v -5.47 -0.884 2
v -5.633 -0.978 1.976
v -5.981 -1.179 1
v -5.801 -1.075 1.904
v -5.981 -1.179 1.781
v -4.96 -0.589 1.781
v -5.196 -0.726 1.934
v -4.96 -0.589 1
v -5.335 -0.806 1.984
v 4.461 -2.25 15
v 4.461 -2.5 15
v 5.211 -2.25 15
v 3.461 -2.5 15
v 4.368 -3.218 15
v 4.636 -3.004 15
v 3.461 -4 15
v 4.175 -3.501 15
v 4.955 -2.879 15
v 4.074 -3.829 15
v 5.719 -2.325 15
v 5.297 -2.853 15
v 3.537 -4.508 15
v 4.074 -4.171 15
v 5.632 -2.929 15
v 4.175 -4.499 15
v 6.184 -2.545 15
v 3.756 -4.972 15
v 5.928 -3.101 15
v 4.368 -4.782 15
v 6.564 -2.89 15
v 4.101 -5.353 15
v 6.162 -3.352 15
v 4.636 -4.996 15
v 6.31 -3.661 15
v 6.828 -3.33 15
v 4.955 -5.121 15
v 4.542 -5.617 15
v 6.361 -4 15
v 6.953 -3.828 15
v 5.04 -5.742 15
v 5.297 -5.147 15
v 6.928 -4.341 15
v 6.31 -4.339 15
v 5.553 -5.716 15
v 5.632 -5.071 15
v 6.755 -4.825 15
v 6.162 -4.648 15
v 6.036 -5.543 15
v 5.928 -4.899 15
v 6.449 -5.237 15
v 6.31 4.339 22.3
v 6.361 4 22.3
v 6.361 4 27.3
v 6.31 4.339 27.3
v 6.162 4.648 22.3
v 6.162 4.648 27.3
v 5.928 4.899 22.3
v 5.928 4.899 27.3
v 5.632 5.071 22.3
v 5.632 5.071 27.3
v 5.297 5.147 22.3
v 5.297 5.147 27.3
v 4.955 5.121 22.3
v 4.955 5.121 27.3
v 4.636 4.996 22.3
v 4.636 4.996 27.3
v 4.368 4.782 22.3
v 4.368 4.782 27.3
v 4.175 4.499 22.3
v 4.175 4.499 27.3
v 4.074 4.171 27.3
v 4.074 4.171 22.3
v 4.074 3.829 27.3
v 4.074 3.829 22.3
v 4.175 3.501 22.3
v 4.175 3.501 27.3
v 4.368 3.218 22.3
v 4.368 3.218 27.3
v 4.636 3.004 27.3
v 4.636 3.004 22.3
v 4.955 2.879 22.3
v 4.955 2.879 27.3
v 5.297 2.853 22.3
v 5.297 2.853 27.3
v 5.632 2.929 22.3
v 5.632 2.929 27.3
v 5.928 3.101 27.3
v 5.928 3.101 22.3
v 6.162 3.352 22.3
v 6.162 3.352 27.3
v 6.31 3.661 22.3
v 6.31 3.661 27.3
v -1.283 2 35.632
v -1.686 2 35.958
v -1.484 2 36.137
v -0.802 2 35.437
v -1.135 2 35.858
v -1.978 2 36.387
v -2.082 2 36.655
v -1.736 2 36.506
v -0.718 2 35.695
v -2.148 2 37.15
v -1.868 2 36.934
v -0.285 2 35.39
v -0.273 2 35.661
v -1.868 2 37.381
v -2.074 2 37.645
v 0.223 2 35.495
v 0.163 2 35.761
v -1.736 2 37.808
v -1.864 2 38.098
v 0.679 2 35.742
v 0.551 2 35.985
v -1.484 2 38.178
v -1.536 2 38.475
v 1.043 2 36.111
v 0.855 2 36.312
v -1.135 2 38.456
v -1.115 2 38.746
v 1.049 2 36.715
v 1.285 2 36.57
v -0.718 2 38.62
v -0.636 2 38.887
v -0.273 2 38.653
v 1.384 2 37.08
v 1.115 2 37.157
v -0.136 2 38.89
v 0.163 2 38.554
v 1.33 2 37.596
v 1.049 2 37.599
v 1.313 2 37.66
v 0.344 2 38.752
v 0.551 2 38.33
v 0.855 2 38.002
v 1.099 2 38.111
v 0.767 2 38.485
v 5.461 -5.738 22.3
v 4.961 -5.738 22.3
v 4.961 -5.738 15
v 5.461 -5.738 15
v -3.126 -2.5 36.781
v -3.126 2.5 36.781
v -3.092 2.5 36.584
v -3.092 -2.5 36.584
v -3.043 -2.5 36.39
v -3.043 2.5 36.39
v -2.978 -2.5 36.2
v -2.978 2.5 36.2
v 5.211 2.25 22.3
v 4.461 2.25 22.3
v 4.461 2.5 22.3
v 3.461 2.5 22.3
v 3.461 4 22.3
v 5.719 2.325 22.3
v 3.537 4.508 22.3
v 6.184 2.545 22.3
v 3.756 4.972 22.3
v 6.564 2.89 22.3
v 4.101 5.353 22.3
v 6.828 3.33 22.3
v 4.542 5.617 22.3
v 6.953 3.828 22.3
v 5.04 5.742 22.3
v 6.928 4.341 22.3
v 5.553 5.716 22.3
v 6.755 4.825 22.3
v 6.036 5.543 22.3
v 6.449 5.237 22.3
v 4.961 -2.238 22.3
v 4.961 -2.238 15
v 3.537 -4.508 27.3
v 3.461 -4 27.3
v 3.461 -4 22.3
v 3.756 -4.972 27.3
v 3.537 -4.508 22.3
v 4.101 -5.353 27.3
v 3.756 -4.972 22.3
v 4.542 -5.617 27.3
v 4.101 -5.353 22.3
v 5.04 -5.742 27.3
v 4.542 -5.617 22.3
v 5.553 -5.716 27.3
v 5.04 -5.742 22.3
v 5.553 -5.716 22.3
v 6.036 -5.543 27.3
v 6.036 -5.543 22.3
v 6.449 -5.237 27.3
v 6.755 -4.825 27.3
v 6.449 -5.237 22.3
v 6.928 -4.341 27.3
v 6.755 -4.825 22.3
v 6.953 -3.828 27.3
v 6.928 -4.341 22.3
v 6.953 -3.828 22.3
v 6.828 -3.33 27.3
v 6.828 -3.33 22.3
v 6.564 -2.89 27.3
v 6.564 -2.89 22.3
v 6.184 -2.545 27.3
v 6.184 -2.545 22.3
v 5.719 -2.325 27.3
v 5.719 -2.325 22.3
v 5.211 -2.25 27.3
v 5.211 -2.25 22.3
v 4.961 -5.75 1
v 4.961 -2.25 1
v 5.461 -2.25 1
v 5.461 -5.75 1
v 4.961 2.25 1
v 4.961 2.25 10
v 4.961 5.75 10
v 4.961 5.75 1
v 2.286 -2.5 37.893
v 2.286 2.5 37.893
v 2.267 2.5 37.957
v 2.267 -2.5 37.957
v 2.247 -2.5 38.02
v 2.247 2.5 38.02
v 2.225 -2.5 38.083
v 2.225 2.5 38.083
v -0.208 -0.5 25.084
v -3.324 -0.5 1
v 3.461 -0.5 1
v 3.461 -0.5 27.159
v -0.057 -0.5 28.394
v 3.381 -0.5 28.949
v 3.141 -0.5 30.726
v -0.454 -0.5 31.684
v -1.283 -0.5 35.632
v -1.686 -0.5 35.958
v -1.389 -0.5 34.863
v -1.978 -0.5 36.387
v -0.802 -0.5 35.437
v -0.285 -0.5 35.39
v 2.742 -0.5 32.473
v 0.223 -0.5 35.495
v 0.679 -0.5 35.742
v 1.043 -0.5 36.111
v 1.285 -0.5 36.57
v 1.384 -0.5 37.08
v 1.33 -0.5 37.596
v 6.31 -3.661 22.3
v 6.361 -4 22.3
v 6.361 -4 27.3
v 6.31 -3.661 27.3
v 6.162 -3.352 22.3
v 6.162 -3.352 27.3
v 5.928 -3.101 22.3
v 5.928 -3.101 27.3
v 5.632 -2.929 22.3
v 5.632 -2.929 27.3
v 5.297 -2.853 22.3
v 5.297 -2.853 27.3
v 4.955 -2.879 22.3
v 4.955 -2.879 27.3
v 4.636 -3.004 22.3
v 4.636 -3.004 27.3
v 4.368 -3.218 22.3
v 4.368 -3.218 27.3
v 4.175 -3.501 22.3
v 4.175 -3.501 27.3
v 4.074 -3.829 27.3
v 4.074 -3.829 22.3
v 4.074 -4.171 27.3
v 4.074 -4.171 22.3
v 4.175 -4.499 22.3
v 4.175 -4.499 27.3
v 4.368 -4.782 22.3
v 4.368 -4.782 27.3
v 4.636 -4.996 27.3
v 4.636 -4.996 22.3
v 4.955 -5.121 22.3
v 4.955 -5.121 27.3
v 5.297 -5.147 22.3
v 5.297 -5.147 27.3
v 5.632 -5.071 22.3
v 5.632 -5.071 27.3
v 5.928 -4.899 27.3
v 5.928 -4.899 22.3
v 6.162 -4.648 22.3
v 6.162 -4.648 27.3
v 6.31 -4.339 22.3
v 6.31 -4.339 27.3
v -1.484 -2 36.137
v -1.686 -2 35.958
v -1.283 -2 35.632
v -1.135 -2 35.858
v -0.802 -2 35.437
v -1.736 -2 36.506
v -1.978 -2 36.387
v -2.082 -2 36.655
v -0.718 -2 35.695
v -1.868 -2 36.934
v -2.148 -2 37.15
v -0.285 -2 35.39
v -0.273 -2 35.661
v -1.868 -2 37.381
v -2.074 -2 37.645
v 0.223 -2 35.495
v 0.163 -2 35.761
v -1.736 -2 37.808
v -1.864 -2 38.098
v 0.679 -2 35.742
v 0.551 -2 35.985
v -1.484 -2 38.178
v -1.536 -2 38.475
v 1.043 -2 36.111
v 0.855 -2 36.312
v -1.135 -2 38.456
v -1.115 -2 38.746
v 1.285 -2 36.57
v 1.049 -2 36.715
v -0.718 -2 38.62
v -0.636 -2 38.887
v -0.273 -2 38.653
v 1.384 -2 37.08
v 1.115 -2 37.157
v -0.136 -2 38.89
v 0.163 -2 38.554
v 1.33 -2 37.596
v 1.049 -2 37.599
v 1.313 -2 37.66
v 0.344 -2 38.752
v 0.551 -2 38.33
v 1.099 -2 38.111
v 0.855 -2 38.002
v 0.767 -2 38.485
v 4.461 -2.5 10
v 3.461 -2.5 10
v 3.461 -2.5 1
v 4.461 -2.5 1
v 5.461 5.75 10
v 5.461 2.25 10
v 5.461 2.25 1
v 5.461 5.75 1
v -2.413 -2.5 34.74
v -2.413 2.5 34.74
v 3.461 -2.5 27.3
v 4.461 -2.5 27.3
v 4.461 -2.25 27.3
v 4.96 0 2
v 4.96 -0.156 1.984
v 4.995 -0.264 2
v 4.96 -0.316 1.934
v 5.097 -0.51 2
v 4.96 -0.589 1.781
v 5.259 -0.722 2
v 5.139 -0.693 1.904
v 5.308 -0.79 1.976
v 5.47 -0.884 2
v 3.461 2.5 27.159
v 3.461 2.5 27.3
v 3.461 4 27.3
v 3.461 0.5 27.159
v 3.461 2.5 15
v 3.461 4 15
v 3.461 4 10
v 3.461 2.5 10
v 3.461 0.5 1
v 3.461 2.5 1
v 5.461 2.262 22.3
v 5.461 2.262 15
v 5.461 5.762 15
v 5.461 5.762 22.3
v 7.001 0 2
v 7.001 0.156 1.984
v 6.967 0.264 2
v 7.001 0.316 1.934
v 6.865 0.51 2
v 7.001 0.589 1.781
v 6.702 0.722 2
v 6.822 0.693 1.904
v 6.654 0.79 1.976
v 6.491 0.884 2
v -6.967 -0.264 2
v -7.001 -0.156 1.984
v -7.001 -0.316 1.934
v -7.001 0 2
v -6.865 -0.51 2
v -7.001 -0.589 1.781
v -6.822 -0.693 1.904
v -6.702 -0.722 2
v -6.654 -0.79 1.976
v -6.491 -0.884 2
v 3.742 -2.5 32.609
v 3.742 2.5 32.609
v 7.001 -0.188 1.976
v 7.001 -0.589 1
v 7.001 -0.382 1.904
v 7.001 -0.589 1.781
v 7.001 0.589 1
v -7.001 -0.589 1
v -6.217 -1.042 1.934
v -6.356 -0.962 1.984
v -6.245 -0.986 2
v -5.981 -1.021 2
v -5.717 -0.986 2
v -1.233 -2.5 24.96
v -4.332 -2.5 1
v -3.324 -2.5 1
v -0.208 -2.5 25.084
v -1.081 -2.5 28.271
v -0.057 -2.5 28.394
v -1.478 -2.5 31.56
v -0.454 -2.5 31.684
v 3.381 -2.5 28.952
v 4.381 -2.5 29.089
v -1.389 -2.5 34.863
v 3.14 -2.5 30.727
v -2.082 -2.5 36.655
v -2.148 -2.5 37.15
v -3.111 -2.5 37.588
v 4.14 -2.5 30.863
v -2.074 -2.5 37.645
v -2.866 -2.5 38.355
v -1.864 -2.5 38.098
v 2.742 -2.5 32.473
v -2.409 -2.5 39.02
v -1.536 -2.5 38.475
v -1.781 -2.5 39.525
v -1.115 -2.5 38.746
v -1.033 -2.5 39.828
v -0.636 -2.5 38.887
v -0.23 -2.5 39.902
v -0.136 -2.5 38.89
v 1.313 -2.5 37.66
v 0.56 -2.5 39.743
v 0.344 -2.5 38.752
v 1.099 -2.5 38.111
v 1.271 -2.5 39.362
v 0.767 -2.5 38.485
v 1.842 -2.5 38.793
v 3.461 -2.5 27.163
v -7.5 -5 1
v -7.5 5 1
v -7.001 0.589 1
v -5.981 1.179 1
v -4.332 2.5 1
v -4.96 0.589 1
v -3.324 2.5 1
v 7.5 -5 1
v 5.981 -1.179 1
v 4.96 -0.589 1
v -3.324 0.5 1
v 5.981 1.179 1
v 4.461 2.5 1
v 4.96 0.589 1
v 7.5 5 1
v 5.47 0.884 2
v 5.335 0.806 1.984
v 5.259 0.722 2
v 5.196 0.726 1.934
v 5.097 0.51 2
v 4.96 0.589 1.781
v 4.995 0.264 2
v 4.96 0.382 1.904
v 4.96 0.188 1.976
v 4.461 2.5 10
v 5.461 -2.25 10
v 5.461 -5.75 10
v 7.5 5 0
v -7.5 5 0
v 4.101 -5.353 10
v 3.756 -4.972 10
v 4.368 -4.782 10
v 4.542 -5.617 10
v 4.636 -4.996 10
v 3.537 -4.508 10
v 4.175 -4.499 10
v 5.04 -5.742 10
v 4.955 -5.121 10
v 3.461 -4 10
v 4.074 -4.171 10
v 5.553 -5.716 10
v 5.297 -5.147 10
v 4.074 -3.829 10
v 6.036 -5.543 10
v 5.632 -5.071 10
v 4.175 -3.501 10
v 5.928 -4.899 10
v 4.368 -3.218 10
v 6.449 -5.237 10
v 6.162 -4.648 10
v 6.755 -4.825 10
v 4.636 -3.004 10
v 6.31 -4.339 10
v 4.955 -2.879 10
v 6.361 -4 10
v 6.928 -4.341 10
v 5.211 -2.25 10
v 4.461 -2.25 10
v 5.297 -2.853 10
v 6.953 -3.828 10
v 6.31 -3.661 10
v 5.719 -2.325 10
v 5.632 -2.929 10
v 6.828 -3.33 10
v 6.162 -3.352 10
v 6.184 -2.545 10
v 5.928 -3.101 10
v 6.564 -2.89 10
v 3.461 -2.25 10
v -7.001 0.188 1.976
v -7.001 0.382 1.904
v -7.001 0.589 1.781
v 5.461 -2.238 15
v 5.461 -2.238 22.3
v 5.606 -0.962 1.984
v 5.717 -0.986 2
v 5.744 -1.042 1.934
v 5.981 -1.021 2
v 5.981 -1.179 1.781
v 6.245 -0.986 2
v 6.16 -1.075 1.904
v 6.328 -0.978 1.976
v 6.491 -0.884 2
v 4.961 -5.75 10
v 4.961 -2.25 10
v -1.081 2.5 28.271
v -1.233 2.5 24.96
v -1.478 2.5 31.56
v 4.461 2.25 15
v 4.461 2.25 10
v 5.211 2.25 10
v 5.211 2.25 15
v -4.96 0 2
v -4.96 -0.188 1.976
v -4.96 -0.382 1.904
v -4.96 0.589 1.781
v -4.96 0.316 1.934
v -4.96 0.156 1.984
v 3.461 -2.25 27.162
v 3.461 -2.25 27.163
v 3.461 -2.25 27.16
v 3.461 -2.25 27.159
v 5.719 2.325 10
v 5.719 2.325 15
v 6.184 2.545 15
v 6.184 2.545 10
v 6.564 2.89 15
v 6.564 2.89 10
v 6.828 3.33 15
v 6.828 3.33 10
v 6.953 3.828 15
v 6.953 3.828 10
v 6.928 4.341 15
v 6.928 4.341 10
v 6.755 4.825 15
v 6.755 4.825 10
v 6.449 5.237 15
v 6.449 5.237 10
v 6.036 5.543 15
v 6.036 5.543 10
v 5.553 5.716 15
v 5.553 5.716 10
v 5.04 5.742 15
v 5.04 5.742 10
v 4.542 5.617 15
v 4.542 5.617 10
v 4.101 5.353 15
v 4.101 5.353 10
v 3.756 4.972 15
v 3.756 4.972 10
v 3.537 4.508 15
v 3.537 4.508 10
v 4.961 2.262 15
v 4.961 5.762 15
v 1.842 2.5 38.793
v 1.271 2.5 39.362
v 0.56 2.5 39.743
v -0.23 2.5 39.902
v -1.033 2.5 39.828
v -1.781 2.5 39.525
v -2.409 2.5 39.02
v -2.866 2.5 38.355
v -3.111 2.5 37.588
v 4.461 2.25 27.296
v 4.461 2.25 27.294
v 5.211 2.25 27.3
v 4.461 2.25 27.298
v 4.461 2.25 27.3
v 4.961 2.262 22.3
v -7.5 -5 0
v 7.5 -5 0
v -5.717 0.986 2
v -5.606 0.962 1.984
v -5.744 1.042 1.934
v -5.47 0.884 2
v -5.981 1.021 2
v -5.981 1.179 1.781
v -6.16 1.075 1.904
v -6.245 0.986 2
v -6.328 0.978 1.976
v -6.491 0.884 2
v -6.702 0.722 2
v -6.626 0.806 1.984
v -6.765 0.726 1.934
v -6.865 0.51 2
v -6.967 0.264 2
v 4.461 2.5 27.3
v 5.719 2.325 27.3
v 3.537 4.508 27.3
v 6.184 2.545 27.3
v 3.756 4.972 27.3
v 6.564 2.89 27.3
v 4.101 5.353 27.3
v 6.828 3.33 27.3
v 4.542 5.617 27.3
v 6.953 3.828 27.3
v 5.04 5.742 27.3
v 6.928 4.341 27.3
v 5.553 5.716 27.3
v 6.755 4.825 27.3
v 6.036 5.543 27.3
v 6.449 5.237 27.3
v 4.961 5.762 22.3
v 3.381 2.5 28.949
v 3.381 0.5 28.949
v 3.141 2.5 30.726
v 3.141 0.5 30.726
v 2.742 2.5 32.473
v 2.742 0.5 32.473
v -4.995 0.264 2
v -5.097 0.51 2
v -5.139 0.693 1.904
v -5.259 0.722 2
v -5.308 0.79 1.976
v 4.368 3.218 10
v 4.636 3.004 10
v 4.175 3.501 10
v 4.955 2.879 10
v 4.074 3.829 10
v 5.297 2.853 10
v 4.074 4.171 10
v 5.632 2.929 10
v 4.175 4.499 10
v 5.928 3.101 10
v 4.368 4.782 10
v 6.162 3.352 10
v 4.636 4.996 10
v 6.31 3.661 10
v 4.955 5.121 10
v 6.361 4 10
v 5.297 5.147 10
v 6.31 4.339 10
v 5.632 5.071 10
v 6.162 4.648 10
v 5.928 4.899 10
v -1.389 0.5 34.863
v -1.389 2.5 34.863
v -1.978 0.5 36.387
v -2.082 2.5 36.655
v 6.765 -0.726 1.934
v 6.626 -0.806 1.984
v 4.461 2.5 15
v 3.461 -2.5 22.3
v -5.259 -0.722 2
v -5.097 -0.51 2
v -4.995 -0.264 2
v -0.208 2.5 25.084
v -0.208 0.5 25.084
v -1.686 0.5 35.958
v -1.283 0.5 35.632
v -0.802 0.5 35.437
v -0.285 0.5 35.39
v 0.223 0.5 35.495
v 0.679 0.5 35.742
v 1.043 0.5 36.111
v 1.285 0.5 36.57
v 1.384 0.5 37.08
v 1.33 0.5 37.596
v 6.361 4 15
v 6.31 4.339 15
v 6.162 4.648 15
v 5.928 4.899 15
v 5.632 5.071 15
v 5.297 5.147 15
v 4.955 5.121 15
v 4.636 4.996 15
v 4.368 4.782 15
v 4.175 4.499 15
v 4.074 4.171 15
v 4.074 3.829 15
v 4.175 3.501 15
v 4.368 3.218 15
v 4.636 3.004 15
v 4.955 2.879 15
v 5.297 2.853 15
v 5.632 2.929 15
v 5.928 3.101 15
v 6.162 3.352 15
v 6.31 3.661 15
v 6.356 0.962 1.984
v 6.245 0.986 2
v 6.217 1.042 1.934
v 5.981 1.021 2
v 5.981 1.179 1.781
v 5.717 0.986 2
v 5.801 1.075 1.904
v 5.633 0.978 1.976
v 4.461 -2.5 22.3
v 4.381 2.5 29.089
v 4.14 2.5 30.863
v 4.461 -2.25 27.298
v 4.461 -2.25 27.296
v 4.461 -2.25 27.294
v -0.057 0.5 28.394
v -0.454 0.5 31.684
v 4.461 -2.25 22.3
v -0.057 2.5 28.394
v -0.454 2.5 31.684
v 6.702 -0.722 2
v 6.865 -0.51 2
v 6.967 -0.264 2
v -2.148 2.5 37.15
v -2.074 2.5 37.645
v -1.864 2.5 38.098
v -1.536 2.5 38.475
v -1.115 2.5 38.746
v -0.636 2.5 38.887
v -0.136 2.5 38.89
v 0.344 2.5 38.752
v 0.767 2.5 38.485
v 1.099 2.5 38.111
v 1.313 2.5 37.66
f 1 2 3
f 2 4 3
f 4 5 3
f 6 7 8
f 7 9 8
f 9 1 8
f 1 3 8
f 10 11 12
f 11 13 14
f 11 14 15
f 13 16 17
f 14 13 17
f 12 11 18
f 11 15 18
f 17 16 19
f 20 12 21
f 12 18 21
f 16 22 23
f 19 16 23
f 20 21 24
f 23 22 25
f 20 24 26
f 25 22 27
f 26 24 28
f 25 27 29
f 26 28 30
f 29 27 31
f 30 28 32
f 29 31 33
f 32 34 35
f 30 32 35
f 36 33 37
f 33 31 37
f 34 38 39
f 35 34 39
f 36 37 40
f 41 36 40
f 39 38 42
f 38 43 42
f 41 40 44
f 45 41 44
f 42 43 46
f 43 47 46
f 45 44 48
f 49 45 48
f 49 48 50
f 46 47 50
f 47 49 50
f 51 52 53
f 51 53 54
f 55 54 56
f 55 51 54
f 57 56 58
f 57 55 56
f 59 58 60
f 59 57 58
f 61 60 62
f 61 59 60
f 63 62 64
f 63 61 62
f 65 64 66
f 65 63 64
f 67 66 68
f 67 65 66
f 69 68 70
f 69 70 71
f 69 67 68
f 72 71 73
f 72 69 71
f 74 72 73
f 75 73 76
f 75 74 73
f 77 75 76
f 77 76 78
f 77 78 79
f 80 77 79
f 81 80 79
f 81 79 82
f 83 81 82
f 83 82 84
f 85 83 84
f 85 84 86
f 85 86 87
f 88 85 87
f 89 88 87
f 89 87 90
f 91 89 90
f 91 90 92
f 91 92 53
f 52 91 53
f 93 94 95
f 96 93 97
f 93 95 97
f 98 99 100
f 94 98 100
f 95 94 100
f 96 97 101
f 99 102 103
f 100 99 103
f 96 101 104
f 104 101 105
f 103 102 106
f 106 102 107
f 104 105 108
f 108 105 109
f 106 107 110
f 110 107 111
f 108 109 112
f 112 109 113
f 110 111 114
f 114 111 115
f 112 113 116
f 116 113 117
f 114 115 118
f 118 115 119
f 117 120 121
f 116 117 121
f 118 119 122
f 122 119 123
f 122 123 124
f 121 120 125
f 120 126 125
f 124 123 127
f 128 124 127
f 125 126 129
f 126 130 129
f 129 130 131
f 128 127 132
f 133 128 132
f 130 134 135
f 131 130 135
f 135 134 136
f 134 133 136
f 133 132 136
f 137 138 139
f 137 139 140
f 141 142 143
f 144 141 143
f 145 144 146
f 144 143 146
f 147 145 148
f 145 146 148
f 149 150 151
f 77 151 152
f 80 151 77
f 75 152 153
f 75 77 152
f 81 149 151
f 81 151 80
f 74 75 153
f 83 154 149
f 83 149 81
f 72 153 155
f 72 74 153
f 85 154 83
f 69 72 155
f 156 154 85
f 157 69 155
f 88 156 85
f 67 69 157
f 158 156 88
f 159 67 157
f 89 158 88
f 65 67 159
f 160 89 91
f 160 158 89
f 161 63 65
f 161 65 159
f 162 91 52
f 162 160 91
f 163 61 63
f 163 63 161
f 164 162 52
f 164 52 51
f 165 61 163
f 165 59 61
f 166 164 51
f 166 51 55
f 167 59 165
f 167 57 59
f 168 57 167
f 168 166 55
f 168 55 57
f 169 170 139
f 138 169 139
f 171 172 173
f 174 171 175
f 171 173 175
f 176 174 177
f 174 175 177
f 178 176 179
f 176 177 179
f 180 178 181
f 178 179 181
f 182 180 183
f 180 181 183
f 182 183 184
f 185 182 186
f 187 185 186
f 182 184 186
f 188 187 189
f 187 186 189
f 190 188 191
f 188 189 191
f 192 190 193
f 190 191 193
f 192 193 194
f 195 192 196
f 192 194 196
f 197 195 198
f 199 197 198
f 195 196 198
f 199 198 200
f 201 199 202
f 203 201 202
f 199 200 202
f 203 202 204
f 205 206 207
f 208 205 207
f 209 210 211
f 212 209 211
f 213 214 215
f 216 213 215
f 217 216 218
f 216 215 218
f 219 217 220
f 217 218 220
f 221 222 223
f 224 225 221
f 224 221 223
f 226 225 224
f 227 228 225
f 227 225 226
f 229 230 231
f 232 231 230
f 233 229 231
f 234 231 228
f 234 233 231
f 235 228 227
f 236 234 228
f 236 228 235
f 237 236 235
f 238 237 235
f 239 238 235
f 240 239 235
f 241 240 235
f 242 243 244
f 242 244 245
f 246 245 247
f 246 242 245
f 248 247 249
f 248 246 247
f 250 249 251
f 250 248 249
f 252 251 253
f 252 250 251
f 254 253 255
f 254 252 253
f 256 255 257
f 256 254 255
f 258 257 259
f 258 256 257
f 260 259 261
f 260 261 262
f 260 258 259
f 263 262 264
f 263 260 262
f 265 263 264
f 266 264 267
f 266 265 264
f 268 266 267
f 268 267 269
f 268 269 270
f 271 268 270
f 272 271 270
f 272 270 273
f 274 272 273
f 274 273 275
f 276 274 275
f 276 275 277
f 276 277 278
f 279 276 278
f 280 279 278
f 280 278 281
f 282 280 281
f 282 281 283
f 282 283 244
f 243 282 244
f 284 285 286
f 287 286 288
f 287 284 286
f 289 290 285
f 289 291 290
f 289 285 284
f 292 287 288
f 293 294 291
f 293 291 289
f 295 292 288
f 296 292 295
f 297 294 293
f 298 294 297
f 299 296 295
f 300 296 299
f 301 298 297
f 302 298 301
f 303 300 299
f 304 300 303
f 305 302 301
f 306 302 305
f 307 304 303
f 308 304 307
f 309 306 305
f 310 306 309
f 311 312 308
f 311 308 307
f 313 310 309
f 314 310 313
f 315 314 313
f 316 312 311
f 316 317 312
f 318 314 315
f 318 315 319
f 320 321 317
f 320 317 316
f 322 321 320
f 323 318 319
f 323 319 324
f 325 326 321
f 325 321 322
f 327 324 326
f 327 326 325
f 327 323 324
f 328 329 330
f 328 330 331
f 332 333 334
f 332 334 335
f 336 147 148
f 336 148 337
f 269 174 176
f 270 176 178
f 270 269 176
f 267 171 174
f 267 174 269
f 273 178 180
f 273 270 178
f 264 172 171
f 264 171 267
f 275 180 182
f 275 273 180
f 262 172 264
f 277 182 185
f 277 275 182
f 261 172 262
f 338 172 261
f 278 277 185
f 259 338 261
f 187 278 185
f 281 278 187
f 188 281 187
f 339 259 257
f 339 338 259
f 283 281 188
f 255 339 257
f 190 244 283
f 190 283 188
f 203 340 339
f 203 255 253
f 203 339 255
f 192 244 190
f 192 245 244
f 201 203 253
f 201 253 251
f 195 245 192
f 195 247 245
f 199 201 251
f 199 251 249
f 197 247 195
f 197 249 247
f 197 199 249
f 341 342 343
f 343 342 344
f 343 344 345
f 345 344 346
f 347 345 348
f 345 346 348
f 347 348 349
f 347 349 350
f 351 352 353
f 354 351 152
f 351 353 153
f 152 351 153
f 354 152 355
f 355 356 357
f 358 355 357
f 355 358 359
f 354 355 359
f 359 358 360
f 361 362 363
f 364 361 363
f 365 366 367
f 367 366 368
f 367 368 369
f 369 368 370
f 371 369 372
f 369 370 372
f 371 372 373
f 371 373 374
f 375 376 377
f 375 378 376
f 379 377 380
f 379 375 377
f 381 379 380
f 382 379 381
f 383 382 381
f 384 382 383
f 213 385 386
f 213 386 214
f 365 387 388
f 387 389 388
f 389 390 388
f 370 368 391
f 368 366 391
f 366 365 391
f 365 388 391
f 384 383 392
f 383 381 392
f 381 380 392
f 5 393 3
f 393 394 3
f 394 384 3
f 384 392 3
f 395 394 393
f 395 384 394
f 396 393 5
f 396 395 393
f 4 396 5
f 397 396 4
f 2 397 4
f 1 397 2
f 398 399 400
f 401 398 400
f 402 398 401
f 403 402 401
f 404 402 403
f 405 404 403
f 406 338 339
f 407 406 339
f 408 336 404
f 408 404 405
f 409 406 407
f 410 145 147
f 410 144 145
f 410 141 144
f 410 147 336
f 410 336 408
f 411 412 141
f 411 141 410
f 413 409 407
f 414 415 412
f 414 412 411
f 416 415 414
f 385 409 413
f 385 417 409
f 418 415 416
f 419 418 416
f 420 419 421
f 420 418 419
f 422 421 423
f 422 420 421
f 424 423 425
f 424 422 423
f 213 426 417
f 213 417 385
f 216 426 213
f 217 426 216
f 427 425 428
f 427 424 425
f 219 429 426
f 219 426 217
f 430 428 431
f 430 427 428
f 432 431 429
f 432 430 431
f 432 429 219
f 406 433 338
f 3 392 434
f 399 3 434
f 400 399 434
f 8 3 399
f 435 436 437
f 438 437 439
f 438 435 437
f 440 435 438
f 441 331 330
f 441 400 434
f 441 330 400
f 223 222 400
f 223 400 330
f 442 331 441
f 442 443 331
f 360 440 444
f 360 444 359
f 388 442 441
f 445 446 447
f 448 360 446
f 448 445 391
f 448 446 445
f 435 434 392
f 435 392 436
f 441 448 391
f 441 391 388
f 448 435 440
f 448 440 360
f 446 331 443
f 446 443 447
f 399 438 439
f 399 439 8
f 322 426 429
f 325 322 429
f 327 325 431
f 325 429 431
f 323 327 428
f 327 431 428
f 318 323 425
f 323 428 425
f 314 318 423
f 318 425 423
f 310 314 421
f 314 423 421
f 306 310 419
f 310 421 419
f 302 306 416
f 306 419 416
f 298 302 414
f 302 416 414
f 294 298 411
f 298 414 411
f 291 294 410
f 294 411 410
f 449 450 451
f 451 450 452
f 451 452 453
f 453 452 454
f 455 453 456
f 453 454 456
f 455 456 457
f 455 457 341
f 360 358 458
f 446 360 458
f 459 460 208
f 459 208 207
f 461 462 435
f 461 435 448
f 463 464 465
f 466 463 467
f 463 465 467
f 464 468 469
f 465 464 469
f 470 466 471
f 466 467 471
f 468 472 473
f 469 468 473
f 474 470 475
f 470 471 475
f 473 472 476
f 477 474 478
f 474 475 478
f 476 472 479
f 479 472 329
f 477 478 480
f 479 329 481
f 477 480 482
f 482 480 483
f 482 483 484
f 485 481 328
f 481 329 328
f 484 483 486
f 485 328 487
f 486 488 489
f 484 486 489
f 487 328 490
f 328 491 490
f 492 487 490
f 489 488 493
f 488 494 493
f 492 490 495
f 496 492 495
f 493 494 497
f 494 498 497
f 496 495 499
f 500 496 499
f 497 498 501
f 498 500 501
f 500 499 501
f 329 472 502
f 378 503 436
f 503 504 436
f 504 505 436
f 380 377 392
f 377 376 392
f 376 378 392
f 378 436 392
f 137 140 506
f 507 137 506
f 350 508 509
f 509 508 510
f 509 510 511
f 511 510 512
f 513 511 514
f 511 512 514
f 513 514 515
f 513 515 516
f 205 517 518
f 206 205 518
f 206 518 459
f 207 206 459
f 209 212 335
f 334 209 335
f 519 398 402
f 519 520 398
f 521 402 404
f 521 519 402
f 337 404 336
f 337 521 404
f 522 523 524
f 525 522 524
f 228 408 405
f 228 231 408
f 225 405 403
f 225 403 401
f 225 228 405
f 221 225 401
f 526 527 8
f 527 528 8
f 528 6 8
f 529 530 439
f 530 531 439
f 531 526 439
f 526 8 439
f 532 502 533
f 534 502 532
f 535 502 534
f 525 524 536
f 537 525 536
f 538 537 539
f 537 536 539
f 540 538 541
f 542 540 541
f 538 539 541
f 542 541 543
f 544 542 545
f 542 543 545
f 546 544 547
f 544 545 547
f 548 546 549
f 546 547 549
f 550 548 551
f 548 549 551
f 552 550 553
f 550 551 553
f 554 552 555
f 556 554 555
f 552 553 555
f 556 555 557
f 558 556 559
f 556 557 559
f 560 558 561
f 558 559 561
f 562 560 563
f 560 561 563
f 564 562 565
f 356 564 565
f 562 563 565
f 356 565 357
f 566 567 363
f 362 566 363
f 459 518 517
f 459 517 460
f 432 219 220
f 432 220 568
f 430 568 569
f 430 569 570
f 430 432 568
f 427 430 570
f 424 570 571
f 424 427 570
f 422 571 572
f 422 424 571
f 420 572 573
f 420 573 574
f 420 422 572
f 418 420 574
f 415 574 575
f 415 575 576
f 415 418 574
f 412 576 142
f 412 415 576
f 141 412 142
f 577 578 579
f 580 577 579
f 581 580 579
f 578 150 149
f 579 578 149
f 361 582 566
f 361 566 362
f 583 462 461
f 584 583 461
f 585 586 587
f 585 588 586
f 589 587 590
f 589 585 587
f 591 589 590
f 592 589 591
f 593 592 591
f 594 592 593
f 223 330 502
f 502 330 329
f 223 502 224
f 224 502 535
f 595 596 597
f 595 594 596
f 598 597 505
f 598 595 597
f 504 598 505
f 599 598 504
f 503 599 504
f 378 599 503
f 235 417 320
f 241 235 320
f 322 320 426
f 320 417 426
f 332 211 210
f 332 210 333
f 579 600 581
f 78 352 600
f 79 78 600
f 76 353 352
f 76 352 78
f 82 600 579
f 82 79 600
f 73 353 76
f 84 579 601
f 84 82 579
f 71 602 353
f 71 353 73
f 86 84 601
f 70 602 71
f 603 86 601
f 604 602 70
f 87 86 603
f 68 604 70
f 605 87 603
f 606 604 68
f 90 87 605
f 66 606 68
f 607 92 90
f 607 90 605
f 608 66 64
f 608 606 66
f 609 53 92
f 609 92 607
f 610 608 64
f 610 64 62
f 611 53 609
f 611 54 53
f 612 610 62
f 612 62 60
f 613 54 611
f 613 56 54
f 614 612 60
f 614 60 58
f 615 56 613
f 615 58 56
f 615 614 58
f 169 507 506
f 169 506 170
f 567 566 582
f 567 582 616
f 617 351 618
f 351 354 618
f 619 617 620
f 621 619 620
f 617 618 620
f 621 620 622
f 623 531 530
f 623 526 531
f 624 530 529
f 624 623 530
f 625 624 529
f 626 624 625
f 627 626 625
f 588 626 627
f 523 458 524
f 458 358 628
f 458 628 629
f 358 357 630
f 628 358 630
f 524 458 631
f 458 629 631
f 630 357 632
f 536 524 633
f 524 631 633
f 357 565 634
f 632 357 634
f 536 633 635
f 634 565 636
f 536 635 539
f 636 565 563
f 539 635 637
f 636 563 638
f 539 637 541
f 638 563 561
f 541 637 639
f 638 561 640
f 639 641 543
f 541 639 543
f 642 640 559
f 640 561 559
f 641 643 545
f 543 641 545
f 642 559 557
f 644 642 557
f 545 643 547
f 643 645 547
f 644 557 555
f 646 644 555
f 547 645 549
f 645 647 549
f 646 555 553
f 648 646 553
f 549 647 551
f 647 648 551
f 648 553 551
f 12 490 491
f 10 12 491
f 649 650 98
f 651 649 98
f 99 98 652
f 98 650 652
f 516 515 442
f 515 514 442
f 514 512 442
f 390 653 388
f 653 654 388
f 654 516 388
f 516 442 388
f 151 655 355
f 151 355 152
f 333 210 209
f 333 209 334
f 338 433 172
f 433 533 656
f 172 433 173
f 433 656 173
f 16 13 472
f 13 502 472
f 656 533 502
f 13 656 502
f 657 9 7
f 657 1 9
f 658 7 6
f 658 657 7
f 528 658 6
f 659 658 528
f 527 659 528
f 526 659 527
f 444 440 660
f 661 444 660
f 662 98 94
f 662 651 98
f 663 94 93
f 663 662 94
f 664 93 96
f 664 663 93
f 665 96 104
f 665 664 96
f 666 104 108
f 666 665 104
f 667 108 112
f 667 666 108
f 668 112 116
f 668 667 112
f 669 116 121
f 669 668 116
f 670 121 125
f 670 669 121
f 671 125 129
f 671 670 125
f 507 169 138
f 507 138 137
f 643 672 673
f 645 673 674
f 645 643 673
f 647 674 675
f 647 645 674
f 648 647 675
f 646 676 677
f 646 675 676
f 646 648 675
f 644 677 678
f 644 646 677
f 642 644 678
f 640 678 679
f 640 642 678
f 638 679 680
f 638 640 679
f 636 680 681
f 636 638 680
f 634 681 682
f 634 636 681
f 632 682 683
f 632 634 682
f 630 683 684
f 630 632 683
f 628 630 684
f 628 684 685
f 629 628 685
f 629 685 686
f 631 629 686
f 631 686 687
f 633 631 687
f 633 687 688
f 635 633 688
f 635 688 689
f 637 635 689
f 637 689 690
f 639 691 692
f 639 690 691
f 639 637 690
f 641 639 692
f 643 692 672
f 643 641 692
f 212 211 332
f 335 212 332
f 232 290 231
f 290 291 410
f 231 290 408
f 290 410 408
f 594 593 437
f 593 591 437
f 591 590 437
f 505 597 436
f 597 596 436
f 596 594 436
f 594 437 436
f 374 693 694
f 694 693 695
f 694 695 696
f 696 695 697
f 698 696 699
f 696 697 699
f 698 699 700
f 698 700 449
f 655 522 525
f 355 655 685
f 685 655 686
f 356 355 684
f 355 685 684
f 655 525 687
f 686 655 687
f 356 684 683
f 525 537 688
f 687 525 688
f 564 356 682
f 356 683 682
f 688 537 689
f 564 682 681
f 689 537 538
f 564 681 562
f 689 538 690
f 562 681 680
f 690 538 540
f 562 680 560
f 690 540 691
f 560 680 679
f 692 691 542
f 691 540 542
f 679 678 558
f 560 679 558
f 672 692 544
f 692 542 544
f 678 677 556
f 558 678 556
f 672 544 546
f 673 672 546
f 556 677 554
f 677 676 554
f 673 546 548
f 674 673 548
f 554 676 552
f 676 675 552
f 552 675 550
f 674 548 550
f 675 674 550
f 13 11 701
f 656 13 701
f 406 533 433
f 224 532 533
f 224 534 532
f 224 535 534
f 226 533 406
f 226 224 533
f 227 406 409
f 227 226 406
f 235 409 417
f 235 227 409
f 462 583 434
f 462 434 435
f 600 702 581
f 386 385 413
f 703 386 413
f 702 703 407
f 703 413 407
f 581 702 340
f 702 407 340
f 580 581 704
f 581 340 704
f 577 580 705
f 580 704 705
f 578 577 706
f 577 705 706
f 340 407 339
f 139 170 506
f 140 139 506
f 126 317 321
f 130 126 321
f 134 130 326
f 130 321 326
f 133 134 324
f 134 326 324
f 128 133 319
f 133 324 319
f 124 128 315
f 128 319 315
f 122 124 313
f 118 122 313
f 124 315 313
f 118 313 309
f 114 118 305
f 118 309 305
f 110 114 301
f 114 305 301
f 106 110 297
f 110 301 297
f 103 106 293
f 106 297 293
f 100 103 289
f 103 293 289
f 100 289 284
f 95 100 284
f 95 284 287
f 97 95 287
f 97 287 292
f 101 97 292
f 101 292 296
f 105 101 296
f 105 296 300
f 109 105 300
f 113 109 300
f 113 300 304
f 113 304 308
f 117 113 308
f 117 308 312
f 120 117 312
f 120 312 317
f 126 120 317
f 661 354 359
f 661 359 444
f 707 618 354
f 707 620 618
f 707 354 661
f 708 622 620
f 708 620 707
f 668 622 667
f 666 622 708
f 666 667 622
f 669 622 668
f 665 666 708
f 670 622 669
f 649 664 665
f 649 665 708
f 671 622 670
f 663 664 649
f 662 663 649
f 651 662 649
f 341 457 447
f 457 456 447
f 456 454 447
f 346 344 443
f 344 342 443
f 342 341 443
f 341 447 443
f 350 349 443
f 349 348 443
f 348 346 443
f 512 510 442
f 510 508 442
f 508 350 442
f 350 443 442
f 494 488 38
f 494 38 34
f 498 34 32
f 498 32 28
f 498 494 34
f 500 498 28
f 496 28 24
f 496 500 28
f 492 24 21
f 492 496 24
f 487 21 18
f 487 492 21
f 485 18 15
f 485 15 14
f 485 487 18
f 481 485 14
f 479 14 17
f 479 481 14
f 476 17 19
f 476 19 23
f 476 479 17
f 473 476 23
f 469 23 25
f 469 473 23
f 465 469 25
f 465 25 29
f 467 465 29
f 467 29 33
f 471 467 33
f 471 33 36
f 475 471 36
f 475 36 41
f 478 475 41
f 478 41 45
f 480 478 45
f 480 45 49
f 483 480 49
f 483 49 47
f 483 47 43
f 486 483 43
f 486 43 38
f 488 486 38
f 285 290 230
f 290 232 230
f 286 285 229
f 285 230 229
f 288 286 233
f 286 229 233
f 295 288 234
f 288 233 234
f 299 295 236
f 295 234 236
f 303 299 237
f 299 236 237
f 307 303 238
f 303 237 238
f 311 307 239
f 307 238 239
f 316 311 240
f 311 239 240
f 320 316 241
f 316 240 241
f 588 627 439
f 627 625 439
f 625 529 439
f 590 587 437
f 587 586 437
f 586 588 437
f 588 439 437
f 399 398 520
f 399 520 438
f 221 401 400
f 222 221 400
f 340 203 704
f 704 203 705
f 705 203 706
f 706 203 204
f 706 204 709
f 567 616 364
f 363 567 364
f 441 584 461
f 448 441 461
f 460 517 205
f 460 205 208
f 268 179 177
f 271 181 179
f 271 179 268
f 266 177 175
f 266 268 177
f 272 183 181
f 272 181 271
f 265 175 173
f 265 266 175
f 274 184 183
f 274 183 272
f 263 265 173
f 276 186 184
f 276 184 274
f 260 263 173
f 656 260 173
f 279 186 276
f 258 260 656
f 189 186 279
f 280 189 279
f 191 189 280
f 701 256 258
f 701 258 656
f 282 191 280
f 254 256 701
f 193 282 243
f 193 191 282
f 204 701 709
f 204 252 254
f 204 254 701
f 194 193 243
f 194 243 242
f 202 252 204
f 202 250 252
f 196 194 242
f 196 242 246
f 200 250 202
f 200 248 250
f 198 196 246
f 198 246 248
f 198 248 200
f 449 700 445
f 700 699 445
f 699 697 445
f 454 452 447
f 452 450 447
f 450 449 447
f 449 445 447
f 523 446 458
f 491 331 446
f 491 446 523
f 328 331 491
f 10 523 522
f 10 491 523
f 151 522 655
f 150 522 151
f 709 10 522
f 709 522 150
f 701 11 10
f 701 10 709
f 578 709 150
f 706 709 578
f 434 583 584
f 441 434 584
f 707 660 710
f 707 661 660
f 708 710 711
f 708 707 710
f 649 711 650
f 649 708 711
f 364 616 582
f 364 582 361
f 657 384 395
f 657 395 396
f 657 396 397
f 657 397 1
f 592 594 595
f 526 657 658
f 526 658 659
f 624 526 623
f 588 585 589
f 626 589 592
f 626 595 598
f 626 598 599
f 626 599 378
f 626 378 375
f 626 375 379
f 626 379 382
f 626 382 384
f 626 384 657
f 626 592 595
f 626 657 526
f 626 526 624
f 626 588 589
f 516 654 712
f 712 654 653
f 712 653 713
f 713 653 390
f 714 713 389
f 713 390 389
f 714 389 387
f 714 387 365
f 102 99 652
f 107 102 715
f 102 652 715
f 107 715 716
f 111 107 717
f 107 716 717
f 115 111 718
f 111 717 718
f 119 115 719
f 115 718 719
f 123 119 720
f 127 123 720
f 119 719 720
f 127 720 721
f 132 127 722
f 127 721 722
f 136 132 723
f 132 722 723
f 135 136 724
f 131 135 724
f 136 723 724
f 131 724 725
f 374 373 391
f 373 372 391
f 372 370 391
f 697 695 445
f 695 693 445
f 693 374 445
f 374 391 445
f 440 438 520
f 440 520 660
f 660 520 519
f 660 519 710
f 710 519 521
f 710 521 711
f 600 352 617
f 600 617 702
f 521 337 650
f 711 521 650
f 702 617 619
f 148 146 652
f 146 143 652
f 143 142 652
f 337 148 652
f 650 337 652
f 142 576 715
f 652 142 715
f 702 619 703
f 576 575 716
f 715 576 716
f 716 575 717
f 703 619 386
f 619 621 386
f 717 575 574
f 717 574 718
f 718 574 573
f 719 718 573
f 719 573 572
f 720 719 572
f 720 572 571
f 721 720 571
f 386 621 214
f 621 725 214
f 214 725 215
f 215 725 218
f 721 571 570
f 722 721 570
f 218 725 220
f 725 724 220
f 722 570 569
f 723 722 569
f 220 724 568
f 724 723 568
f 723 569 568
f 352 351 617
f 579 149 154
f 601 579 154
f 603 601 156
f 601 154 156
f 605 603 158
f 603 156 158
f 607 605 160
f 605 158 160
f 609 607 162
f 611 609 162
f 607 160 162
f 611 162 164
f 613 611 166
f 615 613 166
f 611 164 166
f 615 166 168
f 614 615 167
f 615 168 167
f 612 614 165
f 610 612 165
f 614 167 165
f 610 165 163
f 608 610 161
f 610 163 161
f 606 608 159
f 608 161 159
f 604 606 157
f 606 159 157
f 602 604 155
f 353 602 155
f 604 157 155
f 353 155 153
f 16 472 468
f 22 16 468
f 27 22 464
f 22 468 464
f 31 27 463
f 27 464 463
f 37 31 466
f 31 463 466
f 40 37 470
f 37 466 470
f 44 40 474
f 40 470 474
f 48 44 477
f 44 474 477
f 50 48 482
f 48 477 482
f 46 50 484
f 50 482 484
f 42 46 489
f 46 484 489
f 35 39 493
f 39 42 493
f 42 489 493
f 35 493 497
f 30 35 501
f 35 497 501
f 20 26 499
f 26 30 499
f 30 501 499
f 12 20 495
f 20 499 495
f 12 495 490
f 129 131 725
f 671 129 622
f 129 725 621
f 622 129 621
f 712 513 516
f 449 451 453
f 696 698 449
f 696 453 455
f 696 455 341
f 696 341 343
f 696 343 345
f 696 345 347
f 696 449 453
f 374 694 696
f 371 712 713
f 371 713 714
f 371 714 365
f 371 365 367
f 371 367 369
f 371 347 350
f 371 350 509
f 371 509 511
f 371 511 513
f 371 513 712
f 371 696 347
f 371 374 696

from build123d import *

# Parameters (mm, degrees)
F1_DEPTH    = 2.5
F2_R        = 20
F3_T1_DEPTH = 7.2919338558
F3_T3_DEPTH = 5.7629746737
F5_DEPTH    = 2
F6_R        = 20
F8_DEPTH    = 2
F9_W        = 15
F9_H        = 10
F10_DEPTH   = 1
F12_R       = 20
F13_R       = 1.15
F14_DEPTH   = 17.3
F16_W       = 4
F16_H       = 7.3
F17_DEPTH   = 25
F19_D       = 3
F19_DEPTH   = 5
F19_TIP     = 0.9012909285
F20_R       = 1.7700631876
F20_R_2     = 1.5
F21_DEPTH   = 2
F22_W       = 4
F22_H       = 7.3
F23_DEPTH   = 12.5
F24_DEPTH   = 2
F26_DEPTH   = 1
F30_W       = 0.5
F30_H       = 3.5
F31_DEPTH   = 9
F32_W       = 0.5
F32_H       = 3.5
F33_DEPTH   = 7.3


# Not quite as in the source:
# - a fillet or chamfer that OpenCascade refuses, or shapes differently, is made with other operations: its cross-section is extruded or revolved along the edge and cut away or added
# - ends of sketch curves that miss each other by under 0.0002 mm in the source are joined
# - a feature names something its author has since deleted; it is built from what else it names


with BuildPart() as f1:
    # F0 (on Front) → F1 (new body, symmetric)
    with BuildSketch(Plane.XZ):
        with BuildLine():
            Line((-4.461364258, 0), (4.4613697168, 0))
            Line((4.4613697168, 0), (4.4613697168, 30))
            Line((4.4613697168, 30), (2.2730625034, 37.9387021101))
            ThreePointArc((2.2730625034, 37.9387021101), (-1.1809999696, 39.7873473063), (-3.0296451657, 36.3332848334))
            Line((-3.0296451657, 36.3332848334), (-0.5806429216, 30.0000008653))
            Line((-0.5806429216, 30.0000008653), (-4.461364258, 0))
        make_face()
    extrude(amount=F1_DEPTH, both=True)

    # F2
    f2_edges = [f1.edges().sort_by_distance(p)[0] for p in [
        (4.46137, 0, 30),
        (-0.580643, 0, 30.000001),
    ]]
    fillet(f2_edges, radius=F2_R)

    # F3: fillet of radius 2.5 on 3 edges, made by hand

    # F3_s2 → F3_t1 (cut)
    with BuildSketch(Plane.XZ.offset(-3.6459669279)):
        with BuildLine():
            ThreePointArc((-3.1257167168, 36.7814909121), (-3.0693855707, 36.4861770404), (-2.9780129086, 36.1997603554))
            Line((-2.9780129086, 36.1997603554), (-3.0296451657, 36.3332848334))
            ThreePointArc((-3.0296451657, 36.3332848334), (-3.0869674726, 36.5553973342), (-3.1257167168, 36.7814909121))
        make_face()
    extrude(amount=F3_T1_DEPTH, mode=Mode.SUBTRACT)

    # F3_s4 → F3_t3 (cut)
    with BuildSketch(Plane.XZ.offset(-2.8814873369)):
        with BuildLine():
            ThreePointArc((2.2857269032, 37.8927584249), (2.257193358, 37.9887275108), (2.2248400544, 38.0834771409))
            ThreePointArc((2.2248400544, 38.0834771409), (2.2499483239, 38.0114217266), (2.2730625034, 37.9387021101))
            Line((2.2730625034, 37.9387021101), (2.2857269032, 37.8927584249))
        make_face()
    extrude(amount=F3_T3_DEPTH, mode=Mode.SUBTRACT)

    # F4 (on face) → F5 (cut)
    with BuildSketch(Plane.XZ.offset(2.5)):
        with BuildLine():
            Line((-3.3236755119, 0.999999488), (3.4613702287, 0.999999488))
            Line((3.4613702287, 0.999999488), (3.4613702287, 29.8646979397))
            Line((3.4613702287, 29.8646979397), (1.3127120624, 37.6595619399))
            ThreePointArc((1.3127120624, 37.6595619399), (-0.880587822, 38.8334370358), (-2.0819074864, 36.6550481386))
            Line((-2.0819074864, 36.6550481386), (0.4436883577, 30.1236879865))
            Line((0.4436883577, 30.1236879865), (-3.3236755119, 0.999999488))
        make_face()
    extrude(amount=-F5_DEPTH, mode=Mode.SUBTRACT)

    # F6
    f6_edges = [f1.edges().sort_by_distance(p)[0] for p in [
        (0.443688, -1.5, 30.123688),
        (3.46137, -1.5, 29.864698),
    ]]
    fillet(f6_edges, radius=F6_R)

    # F7 (on face) → F8 (cut)
    with BuildSketch(Plane(origin=(0, 2.5, 0), x_dir=(-1, 0, 0), z_dir=(0, 1, 0))):
        with BuildLine():
            Line((-3.4613697168, 29.8646984516), (-3.4613697168, 1))
            Line((-3.4613697168, 1), (3.3236760239, 1))
            Line((3.3236760239, 1), (-0.4436878458, 30.1236884984))
            Line((-0.4436878458, 30.1236884984), (2.0819079984, 36.6550486506))
            ThreePointArc((2.0819079984, 36.6550486506), (0.8805883339, 38.8334375478), (-1.3127115504, 37.6595624519))
            Line((-1.3127115504, 37.6595624519), (-3.4613697168, 29.8646984516))
        make_face()
    extrude(amount=-F8_DEPTH, mode=Mode.SUBTRACT)

    # F9 (on Top) → F10 (join)
    with BuildSketch(Plane.XY):
        Rectangle(F9_W, F9_H)
    extrude(amount=F10_DEPTH)

    # F12
    f12_edges = [f1.edges().sort_by_distance(p)[0] for p in [
        (0.443688, 1.5, 30.123688),
        (3.46137, 1.5, 29.864698),
    ]]
    fillet(f12_edges, radius=F12_R)

    # F13 (on offset) → F14 (join)
    with BuildSketch(Plane.XY.offset(10)):
        with BuildLine():
            ThreePointArc((3.4613697168, -4), (6.4488065838, -5.2374368671), (5.2113697168, -2.25))
            Line((5.2113697168, -2.25), (3.4613697168, -2.25))
            Line((3.4613697168, -2.25), (3.4613697168, -4))
        make_face()
        with Locations((5.2113697168, -4.00000019)):
            Circle(F13_R, mode=Mode.SUBTRACT)
        with BuildLine():
            Line((3.4613697168, 2.25), (5.2113697168, 2.25))
            ThreePointArc((5.2113697168, 2.25), (6.4488065838, 5.2374368671), (3.4613697168, 4))
            Line((3.4613697168, 4), (3.4613697168, 2.25))
        make_face()
        with Locations((5.2113697168, 4.00000019)):
            Circle(F13_R, mode=Mode.SUBTRACT)
    extrude(amount=F14_DEPTH)

    # F16 (on offset) → F17 (cut)
    with BuildSketch(Plane.YZ.offset(8)):
        with Locations((-4.5, 18.65)):
            Rectangle(F16_W, F16_H)
        with Locations((4.5, 18.65)):
            Rectangle(F16_W, F16_H)
    extrude(amount=-F17_DEPTH, mode=Mode.SUBTRACT)

    # F19
    with Locations(Plane(origin=(0, 0.5, 0), x_dir=(-1, 0, 0), z_dir=(0, 1, 0))):
        with Locations((0.384598224, 37.1573055512)):
            Hole(F19_D / 2, depth=F19_DEPTH)
            with Locations((0, 0, -(F19_DEPTH + F19_TIP / 2))):  # 118° drill point
                Cone(0, F19_D / 2, F19_TIP, mode=Mode.SUBTRACT)

    # F20 (on Front) → F21 (join)
    with BuildSketch(Plane.XZ):
        with Locations((-0.384598224, 37.1573055512)):
            Circle(F20_R)
        with Locations((-0.384598224, 37.1573055512)):
            Circle(F20_R_2, mode=Mode.SUBTRACT)
    extrude(amount=F21_DEPTH)

    # F22 (on Front) → F23 (cut, symmetric)
    with BuildSketch(Plane.XZ):
        with Locations((6.4613697168, 18.65)):
            Rectangle(F22_W, F22_H)
    extrude(amount=F23_DEPTH, both=True, mode=Mode.SUBTRACT)

    # F20 (on Front) → F24 (join)
    with BuildSketch(Plane.XZ):
        with Locations((-0.384598224, 37.1573055512)):
            Circle(F20_R)
        with Locations((-0.384598224, 37.1573055512)):
            Circle(F20_R_2, mode=Mode.SUBTRACT)
    extrude(amount=-F24_DEPTH)

    # F25 (on face) → F26 (join)
    with BuildSketch(Plane.XY.offset(0.999999488)):
        Polygon((7.001387421, -0.5893031513), (7.001387421, 0.5893031513), (5.980684422, 1.1786063026), (4.9599814229, 0.5893031513), (4.9599814229, -0.5893031513), (5.980684422, -1.1786063026), align=None)
        Polygon((-5.980684422, -1.1786063026), (-4.9599814229, -0.5893031513), (-4.9599814229, 0.5893031513), (-5.980684422, 1.1786063026), (-7.001387421, 0.5893031513), (-7.001387421, -0.5893031513), align=None)
    extrude(amount=F26_DEPTH)

    # F27 (on Front) → F28 (revolve, cut)
    with BuildSketch(Plane.XZ):
        Polygon((7.3244427331, 1.999999488), (7.001387421, 1.999999488), (7.3244427331, 1.5525314957), align=None)
    revolve(axis=Axis((5.980684422, 0, 1.2804081198), (0, 0, 1)), mode=Mode.SUBTRACT)

    # F27 (on Front) → F29 (revolve, cut)
    with BuildSketch(Plane.XZ):
        Polygon((-7.3244427331, 1.999999488), (-7.3244427331, 1.5525314957), (-7.001387421, 1.999999488), align=None)
    revolve(axis=Axis((-5.980684422, 0, 1.2804081198), (0, 0, 1)), mode=Mode.SUBTRACT)


with BuildPart() as f31:
    # F30 (on offset) → F31 (new body, through all)
    with BuildSketch(Plane.XY.offset(10)):
        with Locations((5.2113697168, 4)):
            Rectangle(F30_W, F30_H)
    extrude(amount=-F31_DEPTH)


with BuildPart() as f31b:
    # F30 (on offset) → F31, piece 2 (new body, through all)
    with BuildSketch(Plane.XY.offset(10)):
        with Locations((5.2113697168, -4)):
            Rectangle(F30_W, F30_H)
    extrude(amount=-F31_DEPTH)


with BuildPart() as f33:
    # F32 (on face) → F33 (new body, through all)
    with BuildSketch(Plane.XY.offset(15)):
        with Locations((5.2113697168, 4.0124509092)):
            Rectangle(F32_W, F32_H)
    extrude(amount=F33_DEPTH)


with BuildPart() as f33b:
    # F32 (on face) → F33, piece 2 (new body, through all)
    with BuildSketch(Plane.XY.offset(15)):
        Polygon((5.4613697168, -4.2375490908), (5.4613697168, -2.2375490908), (4.9613697168, -2.2375490908), (4.9613697168, -4.2375490908), (4.9613697168, -5.7375490908), (5.4613697168, -5.7375490908), align=None)
    extrude(amount=F33_DEPTH)


solid = Compound([f1.part, f31.part, f31b.part, f33.part, f33b.part])
